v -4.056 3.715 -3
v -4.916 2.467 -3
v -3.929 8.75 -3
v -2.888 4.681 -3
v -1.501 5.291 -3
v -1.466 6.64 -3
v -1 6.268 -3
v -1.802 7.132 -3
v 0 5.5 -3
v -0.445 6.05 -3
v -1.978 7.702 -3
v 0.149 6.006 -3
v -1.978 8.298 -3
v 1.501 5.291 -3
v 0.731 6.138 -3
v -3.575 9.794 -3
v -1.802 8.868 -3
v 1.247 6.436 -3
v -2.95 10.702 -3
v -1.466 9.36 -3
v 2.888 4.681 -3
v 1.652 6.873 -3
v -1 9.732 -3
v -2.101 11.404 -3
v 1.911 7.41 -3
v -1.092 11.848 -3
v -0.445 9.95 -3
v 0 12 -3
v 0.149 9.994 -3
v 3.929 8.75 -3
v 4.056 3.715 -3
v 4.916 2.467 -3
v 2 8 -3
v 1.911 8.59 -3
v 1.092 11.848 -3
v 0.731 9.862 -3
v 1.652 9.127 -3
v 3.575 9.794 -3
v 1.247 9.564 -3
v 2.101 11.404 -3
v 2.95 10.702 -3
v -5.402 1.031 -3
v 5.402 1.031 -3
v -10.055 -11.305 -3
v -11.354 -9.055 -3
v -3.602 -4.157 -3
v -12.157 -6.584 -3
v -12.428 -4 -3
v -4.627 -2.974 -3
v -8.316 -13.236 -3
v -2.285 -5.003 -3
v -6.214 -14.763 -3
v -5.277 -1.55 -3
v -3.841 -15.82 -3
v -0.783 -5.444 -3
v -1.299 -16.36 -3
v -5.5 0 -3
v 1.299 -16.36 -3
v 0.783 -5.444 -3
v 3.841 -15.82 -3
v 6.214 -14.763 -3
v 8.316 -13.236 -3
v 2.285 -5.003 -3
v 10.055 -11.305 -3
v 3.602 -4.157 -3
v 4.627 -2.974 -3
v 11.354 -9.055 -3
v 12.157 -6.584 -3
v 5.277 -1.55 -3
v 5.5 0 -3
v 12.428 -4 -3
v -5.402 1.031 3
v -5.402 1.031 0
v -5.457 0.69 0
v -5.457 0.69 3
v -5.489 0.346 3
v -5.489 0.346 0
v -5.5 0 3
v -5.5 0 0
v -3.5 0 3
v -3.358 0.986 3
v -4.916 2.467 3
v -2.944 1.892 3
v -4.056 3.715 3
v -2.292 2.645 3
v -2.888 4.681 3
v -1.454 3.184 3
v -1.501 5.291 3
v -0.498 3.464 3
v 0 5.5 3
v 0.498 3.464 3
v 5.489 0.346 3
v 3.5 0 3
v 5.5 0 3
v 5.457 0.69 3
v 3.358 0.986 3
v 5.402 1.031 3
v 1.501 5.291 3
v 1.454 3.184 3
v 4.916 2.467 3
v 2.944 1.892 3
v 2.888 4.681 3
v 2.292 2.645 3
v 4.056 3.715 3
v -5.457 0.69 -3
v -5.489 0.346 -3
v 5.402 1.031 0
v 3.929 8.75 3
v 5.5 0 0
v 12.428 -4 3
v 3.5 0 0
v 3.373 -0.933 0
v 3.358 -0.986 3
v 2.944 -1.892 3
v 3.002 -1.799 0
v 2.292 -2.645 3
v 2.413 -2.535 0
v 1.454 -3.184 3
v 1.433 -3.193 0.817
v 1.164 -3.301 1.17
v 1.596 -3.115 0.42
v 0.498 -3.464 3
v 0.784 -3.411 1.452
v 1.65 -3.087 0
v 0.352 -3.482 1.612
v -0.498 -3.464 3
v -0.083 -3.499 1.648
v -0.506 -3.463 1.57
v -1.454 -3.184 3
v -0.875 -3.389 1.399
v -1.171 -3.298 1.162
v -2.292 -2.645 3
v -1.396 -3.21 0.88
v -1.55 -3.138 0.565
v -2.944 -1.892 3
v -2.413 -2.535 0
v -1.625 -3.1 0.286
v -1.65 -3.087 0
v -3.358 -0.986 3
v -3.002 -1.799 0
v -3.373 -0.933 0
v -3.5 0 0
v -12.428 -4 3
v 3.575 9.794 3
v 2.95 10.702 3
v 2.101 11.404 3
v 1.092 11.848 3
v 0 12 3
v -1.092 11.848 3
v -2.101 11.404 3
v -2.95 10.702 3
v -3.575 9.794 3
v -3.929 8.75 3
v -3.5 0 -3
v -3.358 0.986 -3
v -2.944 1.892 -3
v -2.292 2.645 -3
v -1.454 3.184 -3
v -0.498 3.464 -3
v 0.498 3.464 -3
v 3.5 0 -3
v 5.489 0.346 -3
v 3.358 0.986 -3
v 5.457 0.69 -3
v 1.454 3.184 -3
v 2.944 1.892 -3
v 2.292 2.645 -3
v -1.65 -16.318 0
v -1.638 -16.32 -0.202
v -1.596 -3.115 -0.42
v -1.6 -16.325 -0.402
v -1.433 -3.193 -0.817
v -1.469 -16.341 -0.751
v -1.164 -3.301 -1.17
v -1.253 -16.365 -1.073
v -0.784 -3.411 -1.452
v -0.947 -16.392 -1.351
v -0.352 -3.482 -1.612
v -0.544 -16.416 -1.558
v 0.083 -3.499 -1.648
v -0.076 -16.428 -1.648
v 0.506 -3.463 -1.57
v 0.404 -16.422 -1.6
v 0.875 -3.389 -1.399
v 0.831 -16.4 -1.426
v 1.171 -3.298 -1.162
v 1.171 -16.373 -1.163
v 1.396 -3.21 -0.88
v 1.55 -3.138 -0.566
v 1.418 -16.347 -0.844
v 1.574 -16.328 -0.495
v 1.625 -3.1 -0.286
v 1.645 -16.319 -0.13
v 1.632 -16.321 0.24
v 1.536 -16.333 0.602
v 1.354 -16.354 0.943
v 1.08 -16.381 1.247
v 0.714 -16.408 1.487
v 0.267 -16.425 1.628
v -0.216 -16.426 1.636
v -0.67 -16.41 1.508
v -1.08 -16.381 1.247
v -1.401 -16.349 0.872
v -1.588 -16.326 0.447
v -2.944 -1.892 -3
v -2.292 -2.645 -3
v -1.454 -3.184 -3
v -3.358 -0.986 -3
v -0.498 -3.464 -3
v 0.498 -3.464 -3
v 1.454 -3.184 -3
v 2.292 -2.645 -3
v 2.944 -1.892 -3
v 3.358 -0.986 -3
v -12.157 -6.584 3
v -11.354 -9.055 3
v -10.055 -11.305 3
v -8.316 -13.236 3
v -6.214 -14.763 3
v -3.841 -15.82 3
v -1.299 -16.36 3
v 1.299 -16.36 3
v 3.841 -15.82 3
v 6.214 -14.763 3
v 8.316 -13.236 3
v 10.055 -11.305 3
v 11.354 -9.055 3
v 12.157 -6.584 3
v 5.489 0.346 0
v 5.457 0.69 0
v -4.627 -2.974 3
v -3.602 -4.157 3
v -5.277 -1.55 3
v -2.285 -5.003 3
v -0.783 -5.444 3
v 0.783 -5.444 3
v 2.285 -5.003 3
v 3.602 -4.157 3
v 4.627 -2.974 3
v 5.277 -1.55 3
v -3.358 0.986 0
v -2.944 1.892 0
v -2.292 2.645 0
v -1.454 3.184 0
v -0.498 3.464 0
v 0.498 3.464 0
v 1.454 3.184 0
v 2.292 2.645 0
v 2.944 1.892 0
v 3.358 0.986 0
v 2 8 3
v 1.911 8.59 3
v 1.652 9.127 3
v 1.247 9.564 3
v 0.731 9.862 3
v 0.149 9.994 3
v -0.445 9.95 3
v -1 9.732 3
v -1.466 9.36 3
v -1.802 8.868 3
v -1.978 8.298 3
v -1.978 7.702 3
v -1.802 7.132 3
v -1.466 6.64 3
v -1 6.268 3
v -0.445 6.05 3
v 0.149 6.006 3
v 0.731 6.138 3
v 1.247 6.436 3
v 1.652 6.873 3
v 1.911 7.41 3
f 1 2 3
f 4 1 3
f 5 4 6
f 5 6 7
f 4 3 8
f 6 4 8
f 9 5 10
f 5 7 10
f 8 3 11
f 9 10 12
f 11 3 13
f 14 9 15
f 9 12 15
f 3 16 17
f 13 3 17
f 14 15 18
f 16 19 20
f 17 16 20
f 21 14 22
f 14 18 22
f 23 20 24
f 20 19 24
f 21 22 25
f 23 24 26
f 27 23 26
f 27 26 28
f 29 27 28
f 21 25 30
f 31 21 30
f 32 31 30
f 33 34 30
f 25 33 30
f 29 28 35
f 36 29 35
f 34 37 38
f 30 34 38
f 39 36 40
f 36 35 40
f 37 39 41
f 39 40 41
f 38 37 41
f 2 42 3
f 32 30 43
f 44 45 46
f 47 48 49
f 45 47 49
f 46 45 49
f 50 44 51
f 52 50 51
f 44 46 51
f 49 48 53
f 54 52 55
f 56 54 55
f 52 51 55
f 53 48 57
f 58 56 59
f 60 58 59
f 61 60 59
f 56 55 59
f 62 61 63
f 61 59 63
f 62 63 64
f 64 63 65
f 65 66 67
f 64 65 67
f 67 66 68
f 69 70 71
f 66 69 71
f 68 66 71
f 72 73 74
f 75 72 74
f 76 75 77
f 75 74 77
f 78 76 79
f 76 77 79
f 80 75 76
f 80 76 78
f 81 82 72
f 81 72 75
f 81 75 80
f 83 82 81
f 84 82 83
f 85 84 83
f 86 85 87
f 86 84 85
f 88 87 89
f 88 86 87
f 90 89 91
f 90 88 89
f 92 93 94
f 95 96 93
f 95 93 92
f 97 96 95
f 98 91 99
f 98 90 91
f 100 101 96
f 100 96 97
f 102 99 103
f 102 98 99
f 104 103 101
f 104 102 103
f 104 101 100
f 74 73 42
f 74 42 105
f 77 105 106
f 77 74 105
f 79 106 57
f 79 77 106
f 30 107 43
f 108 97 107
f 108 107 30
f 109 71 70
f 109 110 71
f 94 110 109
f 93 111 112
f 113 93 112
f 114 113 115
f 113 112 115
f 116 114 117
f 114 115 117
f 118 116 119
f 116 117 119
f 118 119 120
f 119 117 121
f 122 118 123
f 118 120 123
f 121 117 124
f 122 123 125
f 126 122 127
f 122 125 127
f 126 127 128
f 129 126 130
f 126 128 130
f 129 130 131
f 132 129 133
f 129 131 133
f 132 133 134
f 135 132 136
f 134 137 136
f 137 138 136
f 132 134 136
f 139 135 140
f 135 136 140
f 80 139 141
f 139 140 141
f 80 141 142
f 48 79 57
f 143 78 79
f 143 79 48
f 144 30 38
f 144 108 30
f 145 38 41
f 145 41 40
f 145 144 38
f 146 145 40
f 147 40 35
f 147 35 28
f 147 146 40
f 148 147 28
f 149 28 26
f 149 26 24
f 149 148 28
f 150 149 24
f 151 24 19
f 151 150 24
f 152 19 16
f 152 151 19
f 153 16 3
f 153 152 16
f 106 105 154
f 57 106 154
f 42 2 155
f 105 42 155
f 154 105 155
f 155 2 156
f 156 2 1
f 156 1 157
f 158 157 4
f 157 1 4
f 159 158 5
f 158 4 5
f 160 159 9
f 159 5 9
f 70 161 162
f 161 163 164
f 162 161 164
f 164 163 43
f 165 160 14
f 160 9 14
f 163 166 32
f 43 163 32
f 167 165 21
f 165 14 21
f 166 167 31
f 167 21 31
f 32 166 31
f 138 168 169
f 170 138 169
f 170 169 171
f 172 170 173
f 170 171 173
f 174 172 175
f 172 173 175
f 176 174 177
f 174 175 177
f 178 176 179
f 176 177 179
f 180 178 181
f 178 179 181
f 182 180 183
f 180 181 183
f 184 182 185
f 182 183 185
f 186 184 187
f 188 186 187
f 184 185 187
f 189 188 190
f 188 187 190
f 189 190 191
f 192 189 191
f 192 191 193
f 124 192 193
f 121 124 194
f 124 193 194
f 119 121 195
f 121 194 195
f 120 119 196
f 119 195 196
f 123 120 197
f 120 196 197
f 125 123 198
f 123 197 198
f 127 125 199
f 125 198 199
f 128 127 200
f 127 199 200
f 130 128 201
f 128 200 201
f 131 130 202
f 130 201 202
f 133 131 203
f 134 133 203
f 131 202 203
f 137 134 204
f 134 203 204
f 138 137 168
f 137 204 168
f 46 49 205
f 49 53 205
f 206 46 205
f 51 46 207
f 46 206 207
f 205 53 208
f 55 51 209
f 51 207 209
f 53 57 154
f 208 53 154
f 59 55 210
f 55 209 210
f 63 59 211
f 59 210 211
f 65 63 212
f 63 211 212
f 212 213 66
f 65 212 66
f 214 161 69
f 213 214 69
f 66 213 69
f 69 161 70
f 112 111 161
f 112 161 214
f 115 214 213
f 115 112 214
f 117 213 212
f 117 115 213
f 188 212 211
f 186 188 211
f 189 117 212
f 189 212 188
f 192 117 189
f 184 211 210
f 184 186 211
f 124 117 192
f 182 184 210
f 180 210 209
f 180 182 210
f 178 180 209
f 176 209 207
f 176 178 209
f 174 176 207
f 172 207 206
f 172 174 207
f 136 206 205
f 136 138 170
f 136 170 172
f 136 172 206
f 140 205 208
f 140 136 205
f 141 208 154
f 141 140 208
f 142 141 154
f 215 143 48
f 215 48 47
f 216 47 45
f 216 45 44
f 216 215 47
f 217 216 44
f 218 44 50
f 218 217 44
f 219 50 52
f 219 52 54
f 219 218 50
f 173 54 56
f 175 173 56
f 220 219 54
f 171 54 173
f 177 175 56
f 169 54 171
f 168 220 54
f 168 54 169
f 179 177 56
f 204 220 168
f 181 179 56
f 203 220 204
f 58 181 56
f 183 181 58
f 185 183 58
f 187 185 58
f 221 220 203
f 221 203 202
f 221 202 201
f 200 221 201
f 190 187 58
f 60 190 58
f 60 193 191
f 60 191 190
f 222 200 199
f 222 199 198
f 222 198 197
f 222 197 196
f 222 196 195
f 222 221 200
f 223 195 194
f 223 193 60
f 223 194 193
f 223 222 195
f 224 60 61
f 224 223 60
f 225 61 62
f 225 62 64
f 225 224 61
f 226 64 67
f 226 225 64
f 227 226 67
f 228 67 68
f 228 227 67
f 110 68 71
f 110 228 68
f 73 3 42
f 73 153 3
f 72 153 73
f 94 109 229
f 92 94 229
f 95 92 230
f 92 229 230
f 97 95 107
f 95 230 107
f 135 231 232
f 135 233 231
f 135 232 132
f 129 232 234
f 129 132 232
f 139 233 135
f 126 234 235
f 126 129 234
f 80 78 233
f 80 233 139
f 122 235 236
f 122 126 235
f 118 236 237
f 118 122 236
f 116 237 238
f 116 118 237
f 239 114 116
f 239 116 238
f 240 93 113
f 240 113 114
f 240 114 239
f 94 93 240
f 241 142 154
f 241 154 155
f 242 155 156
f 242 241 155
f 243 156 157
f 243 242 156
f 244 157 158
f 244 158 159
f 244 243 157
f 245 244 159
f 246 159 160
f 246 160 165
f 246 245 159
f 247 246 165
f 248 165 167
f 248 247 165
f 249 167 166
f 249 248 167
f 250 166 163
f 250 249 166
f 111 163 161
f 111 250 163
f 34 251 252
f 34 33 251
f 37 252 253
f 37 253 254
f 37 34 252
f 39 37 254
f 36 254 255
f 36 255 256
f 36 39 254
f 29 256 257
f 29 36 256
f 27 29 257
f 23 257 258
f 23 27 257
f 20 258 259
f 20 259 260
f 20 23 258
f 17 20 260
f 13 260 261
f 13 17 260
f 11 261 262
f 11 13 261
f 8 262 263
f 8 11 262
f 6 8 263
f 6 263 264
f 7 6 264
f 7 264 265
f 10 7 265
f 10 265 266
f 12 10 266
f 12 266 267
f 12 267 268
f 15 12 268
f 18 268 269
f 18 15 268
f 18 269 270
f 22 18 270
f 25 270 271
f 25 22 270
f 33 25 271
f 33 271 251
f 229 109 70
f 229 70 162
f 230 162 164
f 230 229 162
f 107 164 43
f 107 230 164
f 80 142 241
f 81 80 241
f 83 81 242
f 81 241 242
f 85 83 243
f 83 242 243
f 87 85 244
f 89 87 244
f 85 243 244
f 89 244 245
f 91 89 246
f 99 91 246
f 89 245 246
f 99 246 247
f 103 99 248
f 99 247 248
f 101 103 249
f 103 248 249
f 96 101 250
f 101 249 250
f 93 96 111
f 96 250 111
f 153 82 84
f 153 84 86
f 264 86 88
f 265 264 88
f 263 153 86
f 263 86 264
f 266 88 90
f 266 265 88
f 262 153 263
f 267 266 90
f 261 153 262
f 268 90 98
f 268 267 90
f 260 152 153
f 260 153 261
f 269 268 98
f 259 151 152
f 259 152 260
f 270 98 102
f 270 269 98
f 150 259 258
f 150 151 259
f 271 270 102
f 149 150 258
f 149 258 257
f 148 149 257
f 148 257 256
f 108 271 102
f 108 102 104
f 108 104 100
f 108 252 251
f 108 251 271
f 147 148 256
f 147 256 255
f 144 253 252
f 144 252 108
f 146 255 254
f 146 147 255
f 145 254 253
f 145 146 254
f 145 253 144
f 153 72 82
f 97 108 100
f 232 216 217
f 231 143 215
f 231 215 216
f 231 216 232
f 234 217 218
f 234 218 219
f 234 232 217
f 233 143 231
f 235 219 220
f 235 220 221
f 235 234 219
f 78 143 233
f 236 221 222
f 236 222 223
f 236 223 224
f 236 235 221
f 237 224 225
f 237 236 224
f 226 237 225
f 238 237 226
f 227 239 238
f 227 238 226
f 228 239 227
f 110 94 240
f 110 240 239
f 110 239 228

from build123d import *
from build123d.topology import SkipClean

# Parameters (mm, degrees)
BOSS_EXTRUDE1_DEPTH    = 3
SKETCH1_R              = 2
BOSS_EXTRUDE1_2_DEPTH  = 3
BOSS_EXTRUDE2_DEPTH    = 3
M4_TAPPED_HOLE1_REACH  = 33.171
M4_TAPPED_HOLE1_BORE_R = 1.65


with BuildPart() as part:
    # Sketch1 → Boss-Extrude1 (new, symmetric)
    with BuildSketch(Plane.XY):
        with BuildLine():
            ThreePointArc((5.5, 0), (0, -5.5), (-5.5, 0))
            Line((-5.5, 0), (-12.42820323, -4))
            ThreePointArc((-12.42820323, -4), (0, -16.42820323), (12.42820323, -4))
            Line((12.42820323, -4), (5.5, 0))
        make_face()
    extrude(amount=BOSS_EXTRUDE1_DEPTH, both=True)



with BuildPart() as body_2:
    # Sketch1 → Boss-Extrude1 2 (new, symmetric)
    with BuildSketch(Plane.XY):
        with BuildLine():
            Line((-3.929058411, 8.75), (-5.402455316, 1.03125))
            ThreePointArc((-5.402455316, 1.03125), (0, 5.5), (5.402455316, 1.03125))
            Line((5.402455316, 1.03125), (3.929058411, 8.75))
            ThreePointArc((3.929058411, 8.75), (0, 12), (-3.929058411, 8.75))
        make_face()
        with Locations((0, 8)):
            Circle(SKETCH1_R, mode=Mode.SUBTRACT)
    extrude(amount=BOSS_EXTRUDE1_2_DEPTH, both=True)


with BuildPart() as part_1:
    with SkipClean():  # the faces are left unmerged after this step: merging them gives an invalid solid
        add(part.part)

        add(body_2.part)  # Boss-Extrude2 merges body 2
        # Sketch1<3> → Boss-Extrude2 (add, symmetric)
        with BuildSketch(Plane.XY):
            with BuildLine():
                ThreePointArc((-3.5, 0), (0, 3.5), (3.5, 0))
                Line((3.5, 0), (5.5, 0))
                ThreePointArc((5.5, 0), (5.475559526, 0.517926522), (5.402455316, 1.03125))
                ThreePointArc((5.402455316, 1.03125), (0, 5.5), (-5.402455316, 1.03125))
                ThreePointArc((-5.402455316, 1.03125), (-5.475559526, 0.517926522), (-5.5, 0))
                Line((-5.5, 0), (-3.5, 0))
            make_face()
            with BuildLine():
                Line((5.5, 0), (3.5, 0))
                ThreePointArc((3.5, 0), (0, -3.5), (-3.5, 0))
                Line((-3.5, 0), (-5.5, 0))
                ThreePointArc((-5.5, 0), (0, -5.5), (5.5, 0))
            make_face()
        extrude(amount=BOSS_EXTRUDE2_DEPTH, both=True)

    # M4 Tapped Hole1 bore → M4 Tapped Hole1 (cut, up to next)
    with BuildSketch(Plane(origin=(0, -16.42820323, 0), x_dir=(-1, 0, 0), z_dir=(0, -1, 0)), mode=Mode.PRIVATE) as m4_tapped_hole1_sk1:
        Circle(M4_TAPPED_HOLE1_BORE_R)
    m4_tapped_hole1_tool1 = extrude(m4_tapped_hole1_sk1.sketch, amount=-M4_TAPPED_HOLE1_REACH, mode=Mode.PRIVATE) & part_1.part
    add(m4_tapped_hole1_tool1.solids().sort_by_distance((0, -16.428203, 0))[0], mode=Mode.SUBTRACT)


solid = part_1.part
